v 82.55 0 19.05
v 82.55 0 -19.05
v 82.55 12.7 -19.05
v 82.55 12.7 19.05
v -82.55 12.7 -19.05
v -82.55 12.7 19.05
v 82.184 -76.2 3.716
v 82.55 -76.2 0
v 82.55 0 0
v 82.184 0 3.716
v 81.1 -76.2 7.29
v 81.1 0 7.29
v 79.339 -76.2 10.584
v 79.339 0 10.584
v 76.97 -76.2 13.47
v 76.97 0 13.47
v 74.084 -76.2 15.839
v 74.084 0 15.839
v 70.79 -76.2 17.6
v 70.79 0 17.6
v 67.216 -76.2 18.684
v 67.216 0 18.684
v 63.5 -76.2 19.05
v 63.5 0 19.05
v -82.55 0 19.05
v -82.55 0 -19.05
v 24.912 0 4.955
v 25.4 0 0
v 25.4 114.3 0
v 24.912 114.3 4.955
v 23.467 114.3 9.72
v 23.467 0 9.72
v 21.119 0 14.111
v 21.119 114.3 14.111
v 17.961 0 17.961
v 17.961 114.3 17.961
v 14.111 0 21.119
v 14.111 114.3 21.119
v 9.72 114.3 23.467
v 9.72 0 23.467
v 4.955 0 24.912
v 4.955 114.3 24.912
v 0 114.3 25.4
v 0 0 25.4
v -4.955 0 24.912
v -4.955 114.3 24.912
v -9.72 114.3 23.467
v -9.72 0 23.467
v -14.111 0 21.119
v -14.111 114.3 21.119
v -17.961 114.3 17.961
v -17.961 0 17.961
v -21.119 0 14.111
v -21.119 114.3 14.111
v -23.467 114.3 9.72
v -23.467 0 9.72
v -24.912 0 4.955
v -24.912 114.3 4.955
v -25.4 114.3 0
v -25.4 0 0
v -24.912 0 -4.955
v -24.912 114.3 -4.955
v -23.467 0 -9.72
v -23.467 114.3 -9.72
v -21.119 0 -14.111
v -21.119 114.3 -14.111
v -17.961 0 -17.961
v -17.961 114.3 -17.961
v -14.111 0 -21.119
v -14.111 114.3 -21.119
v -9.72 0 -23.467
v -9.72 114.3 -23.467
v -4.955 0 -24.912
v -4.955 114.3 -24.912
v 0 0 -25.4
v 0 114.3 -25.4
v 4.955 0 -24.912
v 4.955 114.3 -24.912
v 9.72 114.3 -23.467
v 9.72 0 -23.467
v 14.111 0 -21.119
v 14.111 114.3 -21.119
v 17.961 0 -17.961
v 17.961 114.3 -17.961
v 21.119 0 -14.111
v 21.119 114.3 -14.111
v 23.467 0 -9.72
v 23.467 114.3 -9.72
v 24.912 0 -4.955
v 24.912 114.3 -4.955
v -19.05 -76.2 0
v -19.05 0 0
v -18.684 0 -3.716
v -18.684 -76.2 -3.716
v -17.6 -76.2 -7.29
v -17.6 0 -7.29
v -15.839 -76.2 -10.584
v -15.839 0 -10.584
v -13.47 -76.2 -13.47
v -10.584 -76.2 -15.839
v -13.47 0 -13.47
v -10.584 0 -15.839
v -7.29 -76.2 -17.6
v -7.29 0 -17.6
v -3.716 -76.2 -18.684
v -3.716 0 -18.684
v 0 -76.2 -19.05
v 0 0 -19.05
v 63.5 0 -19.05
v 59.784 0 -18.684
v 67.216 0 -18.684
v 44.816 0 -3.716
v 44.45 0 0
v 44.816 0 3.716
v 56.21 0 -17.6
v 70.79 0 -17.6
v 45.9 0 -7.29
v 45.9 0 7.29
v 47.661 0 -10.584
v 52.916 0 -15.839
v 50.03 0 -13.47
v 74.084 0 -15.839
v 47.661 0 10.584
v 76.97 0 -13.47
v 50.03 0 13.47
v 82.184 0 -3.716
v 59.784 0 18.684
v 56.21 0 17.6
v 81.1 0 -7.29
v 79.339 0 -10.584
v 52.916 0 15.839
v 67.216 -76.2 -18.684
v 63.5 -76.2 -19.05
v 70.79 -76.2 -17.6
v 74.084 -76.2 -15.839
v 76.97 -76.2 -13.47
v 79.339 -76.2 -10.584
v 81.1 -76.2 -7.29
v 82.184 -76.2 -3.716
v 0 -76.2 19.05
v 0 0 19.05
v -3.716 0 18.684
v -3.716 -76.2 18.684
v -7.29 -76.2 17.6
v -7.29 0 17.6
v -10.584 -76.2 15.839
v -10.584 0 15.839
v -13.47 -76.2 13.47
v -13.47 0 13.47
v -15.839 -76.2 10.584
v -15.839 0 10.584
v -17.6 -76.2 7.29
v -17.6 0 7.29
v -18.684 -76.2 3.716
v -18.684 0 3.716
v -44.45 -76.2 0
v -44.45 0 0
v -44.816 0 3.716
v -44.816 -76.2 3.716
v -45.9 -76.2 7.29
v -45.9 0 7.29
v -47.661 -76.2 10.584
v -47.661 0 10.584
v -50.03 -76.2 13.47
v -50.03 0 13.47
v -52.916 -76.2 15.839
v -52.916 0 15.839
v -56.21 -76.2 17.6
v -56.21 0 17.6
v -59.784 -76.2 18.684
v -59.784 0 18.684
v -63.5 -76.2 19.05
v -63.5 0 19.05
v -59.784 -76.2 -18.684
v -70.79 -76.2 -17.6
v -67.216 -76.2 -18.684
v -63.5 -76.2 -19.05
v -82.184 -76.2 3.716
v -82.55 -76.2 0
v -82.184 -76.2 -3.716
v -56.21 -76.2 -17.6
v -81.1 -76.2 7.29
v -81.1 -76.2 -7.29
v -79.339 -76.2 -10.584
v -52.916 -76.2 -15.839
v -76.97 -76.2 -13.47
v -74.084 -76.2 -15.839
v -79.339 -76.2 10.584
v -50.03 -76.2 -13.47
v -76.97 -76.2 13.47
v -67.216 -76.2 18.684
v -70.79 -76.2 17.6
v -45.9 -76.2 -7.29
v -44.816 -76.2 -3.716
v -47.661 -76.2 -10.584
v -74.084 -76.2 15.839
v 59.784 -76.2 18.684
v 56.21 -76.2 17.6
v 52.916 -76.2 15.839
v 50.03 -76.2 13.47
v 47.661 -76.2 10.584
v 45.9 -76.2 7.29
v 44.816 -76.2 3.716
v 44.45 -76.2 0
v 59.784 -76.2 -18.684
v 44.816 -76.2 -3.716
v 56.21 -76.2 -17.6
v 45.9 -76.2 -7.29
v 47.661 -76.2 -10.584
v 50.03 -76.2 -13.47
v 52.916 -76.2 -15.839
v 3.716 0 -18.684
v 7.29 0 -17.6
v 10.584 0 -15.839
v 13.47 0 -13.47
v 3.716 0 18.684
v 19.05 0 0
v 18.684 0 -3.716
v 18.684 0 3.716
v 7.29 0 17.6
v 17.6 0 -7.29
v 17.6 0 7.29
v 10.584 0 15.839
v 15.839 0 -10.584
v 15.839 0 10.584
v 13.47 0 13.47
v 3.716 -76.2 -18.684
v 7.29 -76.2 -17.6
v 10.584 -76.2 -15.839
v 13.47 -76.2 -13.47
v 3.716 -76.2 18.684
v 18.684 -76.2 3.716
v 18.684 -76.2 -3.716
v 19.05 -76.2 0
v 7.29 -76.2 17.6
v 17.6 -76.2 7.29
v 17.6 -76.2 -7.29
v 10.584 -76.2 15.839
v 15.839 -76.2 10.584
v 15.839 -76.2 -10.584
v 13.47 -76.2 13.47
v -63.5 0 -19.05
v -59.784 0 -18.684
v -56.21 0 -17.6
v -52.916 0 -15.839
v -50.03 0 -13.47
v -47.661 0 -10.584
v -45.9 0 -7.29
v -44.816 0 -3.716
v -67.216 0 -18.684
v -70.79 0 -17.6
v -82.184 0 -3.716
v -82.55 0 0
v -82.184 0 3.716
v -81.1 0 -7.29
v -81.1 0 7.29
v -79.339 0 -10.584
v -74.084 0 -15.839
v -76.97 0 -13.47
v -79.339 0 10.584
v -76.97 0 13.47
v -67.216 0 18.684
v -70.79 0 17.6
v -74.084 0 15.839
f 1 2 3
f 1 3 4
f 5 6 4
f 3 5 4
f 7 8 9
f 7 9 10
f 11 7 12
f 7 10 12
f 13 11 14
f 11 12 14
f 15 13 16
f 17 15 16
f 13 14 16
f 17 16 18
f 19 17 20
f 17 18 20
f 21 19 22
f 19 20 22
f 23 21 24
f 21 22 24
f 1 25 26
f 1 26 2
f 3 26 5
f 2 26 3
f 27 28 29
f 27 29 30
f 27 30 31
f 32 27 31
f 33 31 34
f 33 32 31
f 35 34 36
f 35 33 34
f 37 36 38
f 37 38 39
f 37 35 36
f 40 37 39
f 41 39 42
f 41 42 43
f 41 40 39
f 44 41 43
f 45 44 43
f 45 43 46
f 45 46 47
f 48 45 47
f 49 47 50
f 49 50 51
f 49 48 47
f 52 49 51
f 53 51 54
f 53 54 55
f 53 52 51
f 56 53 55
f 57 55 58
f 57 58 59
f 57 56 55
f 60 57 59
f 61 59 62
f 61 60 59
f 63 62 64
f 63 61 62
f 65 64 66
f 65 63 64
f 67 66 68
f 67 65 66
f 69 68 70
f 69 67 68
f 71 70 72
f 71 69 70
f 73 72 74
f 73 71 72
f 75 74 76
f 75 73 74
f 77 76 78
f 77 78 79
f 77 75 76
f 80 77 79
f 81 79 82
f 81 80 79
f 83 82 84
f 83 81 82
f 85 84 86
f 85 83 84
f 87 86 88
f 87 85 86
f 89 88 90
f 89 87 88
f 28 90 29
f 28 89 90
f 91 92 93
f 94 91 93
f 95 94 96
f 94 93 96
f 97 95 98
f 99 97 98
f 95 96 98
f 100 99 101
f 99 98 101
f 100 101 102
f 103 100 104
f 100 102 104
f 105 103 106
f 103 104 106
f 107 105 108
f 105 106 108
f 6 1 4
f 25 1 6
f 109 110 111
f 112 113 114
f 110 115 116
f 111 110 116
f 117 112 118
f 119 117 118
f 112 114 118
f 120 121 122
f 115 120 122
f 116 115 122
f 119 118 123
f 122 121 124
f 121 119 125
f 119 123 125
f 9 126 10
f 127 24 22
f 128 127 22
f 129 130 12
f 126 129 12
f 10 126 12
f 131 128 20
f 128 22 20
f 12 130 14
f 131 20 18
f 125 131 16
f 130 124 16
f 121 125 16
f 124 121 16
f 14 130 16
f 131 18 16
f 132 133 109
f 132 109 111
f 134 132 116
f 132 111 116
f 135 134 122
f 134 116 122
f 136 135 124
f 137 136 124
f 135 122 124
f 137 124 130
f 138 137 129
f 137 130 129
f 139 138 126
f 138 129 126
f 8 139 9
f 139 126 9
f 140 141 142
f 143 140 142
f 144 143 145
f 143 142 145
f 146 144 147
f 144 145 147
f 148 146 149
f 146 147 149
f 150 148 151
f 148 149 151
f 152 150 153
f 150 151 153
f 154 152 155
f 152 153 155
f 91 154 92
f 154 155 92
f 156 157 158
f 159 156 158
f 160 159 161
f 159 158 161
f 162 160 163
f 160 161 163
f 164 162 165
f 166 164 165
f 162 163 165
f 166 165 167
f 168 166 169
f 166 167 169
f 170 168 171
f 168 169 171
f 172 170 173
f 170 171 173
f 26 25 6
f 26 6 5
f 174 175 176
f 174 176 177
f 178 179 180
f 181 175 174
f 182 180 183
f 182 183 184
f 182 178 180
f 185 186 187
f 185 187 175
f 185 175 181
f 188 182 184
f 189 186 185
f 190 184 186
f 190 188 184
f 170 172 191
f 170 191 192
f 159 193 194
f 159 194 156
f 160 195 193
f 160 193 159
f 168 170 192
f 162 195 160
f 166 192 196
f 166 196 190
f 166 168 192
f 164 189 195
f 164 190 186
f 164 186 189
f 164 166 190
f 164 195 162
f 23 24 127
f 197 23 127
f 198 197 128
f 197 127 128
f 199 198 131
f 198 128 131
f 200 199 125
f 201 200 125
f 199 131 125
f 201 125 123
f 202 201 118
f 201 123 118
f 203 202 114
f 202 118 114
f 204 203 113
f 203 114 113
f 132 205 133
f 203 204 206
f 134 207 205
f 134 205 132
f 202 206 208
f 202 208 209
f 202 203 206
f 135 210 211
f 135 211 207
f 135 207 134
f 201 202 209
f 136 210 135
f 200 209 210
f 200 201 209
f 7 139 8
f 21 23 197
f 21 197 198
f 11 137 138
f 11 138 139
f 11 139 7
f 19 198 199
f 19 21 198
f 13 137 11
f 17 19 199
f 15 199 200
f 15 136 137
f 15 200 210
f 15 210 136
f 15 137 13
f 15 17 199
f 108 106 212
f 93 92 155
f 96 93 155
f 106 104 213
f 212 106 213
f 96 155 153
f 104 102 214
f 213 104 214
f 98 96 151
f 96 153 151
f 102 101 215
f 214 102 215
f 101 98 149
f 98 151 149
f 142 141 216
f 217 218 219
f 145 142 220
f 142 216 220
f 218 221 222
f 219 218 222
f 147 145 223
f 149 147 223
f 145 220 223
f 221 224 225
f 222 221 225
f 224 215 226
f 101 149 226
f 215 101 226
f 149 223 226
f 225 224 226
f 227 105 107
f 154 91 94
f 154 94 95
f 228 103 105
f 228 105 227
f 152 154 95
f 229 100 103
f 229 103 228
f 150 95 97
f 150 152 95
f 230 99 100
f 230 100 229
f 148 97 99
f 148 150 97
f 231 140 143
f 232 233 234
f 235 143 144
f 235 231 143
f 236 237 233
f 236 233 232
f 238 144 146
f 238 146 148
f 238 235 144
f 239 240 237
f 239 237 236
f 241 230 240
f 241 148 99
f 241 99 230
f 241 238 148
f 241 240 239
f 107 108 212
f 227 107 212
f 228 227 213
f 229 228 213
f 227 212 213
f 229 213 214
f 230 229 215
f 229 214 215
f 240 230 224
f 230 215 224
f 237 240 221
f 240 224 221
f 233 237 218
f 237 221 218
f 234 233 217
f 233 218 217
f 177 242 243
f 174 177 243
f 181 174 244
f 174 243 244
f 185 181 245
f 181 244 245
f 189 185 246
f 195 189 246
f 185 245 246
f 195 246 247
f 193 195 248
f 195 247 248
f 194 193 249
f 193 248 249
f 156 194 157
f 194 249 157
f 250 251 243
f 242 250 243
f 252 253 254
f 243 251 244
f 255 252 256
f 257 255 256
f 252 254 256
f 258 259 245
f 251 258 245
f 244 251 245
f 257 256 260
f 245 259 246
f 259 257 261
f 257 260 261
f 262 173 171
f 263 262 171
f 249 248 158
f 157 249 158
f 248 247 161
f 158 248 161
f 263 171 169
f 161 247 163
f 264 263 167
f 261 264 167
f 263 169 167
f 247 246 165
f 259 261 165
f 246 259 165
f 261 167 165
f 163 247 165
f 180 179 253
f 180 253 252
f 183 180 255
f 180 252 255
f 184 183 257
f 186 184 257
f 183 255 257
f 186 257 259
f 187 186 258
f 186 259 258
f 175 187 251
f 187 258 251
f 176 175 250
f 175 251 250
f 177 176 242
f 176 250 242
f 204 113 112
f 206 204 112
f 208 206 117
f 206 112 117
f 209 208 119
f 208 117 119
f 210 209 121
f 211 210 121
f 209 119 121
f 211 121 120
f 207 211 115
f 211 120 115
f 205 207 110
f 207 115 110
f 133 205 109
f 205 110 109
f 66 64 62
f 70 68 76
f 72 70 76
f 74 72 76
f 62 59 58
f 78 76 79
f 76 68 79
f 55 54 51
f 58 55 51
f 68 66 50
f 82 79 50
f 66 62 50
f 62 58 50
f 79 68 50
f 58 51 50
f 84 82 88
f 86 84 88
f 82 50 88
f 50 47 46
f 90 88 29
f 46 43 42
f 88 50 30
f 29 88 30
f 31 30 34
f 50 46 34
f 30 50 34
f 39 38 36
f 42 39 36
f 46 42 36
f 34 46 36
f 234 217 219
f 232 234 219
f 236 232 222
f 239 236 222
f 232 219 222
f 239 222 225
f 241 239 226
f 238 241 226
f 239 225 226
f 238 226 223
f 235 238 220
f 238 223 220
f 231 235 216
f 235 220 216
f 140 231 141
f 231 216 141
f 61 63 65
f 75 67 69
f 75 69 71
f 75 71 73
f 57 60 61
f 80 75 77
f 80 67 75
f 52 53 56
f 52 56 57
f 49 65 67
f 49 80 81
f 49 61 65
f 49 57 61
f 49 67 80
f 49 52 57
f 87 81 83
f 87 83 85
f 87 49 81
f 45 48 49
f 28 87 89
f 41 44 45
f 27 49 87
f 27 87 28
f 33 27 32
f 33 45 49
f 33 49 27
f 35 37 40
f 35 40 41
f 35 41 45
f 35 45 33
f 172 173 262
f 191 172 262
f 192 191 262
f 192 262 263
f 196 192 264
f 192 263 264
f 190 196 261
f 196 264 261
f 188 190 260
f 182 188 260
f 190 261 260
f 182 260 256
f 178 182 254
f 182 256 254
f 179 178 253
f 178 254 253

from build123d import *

# Parameters (mm, degrees)
F1_DEPTH = 76.2
F2_DEPTH = 12.7
F3_R     = 25.4
F4_DEPTH = 114.3


with BuildPart() as f1:
    # F0 (on Front) → F1 (new body)
    with BuildSketch(Plane.XZ):
        with BuildLine():
            ThreePointArc((-44.45, 0), (-50.0296158184, 13.4703841816), (-63.5, 19.05))
            ThreePointArc((-63.5, 19.05), (-76.9703841264, 13.4703842368), (-82.55, 1.56e-07))
            ThreePointArc((-82.55, 1.56e-07), (-76.9703842368, -13.4703841264), (-63.5, -19.05))
            ThreePointArc((-63.5, -19.05), (-50.0296158184, -13.4703841816), (-44.45, 0))
        make_face()
    extrude(amount=F1_DEPTH)


with BuildPart() as f1b:
    # F0 (on Front) → F1, piece 2 (new body)
    with BuildSketch(Plane.XZ):
        with BuildLine():
            ThreePointArc((-7.38e-08, -19.05), (13.4703841555, -13.4703842077), (19.05, 0))
            Line((19.05, 0), (0, 0))
            Line((0, 0), (-19.05, 0))
            ThreePointArc((-19.05, 0), (-13.4703842077, -13.4703841555), (-7.38e-08, -19.05))
        make_face()
        with BuildLine():
            Line((0, 0), (19.05, 0))
            ThreePointArc((19.05, 0), (13.4703841605, 13.4703842027), (-5.96e-08, 19.05))
            ThreePointArc((-5.96e-08, 19.05), (-13.4703842027, 13.4703841605), (-19.05, 0))
            Line((-19.05, 0), (0, 0))
        make_face()
    extrude(amount=F1_DEPTH)


with BuildPart() as f1c:
    # F0 (on Front) → F1, piece 3 (new body)
    with BuildSketch(Plane.XZ):
        with BuildLine():
            ThreePointArc((63.5, 19.05), (50.0296158184, 13.4703841816), (44.45, 0))
            ThreePointArc((44.45, 0), (50.0296158184, -13.4703841816), (63.5, -19.05))
            ThreePointArc((63.5, -19.05), (76.9703841816, -13.4703841816), (82.55, 0))
            ThreePointArc((82.55, 0), (76.9703841816, 13.4703841816), (63.5, 19.05))
        make_face()
    extrude(amount=F1_DEPTH)


with BuildPart() as f2:
    # F0 (on Front) → F2 (new body)
    with BuildSketch(Plane.XZ):
        with BuildLine():
            ThreePointArc((-7.38e-08, -19.05), (13.4703841555, -13.4703842077), (19.05, 0))
            Line((19.05, 0), (0, 0))
            Line((0, 0), (-19.05, 0))
            ThreePointArc((-19.05, 0), (-13.4703842077, -13.4703841555), (-7.38e-08, -19.05))
        make_face()
        with BuildLine():
            Line((0, 0), (19.05, 0))
            ThreePointArc((19.05, 0), (13.4703841605, 13.4703842027), (-5.96e-08, 19.05))
            ThreePointArc((-5.96e-08, 19.05), (-13.4703842027, 13.4703841605), (-19.05, 0))
            Line((-19.05, 0), (0, 0))
        make_face()
        with BuildLine():
            ThreePointArc((-44.45, 0), (-50.0296158184, 13.4703841816), (-63.5, 19.05))
            ThreePointArc((-63.5, 19.05), (-76.9703841264, 13.4703842368), (-82.55, 1.56e-07))
            ThreePointArc((-82.55, 1.56e-07), (-76.9703842368, -13.4703841264), (-63.5, -19.05))
            ThreePointArc((-63.5, -19.05), (-50.0296158184, -13.4703841816), (-44.45, 0))
        make_face()
        with BuildLine():
            ThreePointArc((-19.05, 0), (-13.4703842027, 13.4703841605), (-5.96e-08, 19.05))
            Line((-5.96e-08, 19.05), (-63.5, 19.05))
            ThreePointArc((-63.5, 19.05), (-50.0296158184, 13.4703841816), (-44.45, 0))
            Line((-44.45, 0), (-19.05, 0))
        make_face()
        with BuildLine():
            Line((-63.5, -19.05), (-7.38e-08, -19.05))
            ThreePointArc((-7.38e-08, -19.05), (-13.4703842077, -13.4703841555), (-19.05, 0))
            Line((-19.05, 0), (-44.45, 0))
            ThreePointArc((-44.45, 0), (-50.0296158184, -13.4703841816), (-63.5, -19.05))
        make_face()
        with BuildLine():
            Line((-82.55, -19.05), (-63.5, -19.05))
            ThreePointArc((-63.5, -19.05), (-76.9703842368, -13.4703841264), (-82.55, 1.56e-07))
            Line((-82.55, 1.56e-07), (-82.55, -19.05))
        make_face()
        with BuildLine():
            ThreePointArc((-82.55, 1.56e-07), (-76.9703841264, 13.4703842368), (-63.5, 19.05))
            Line((-63.5, 19.05), (-82.55, 19.05))
            Line((-82.55, 19.05), (-82.55, 1.56e-07))
        make_face()
        with BuildLine():
            ThreePointArc((-5.96e-08, 19.05), (13.4703841605, 13.4703842027), (19.05, 0))
            Line((19.05, 0), (44.45, 0))
            ThreePointArc((44.45, 0), (50.0296158184, 13.4703841816), (63.5, 19.05))
            Line((63.5, 19.05), (-5.96e-08, 19.05))
        make_face()
        with BuildLine():
            Line((44.45, 0), (19.05, 0))
            ThreePointArc((19.05, 0), (13.4703841555, -13.4703842077), (-7.38e-08, -19.05))
            Line((-7.38e-08, -19.05), (63.5, -19.05))
            ThreePointArc((63.5, -19.05), (50.0296158184, -13.4703841816), (44.45, 0))
        make_face()
        with BuildLine():
            ThreePointArc((63.5, 19.05), (50.0296158184, 13.4703841816), (44.45, 0))
            ThreePointArc((44.45, 0), (50.0296158184, -13.4703841816), (63.5, -19.05))
            ThreePointArc((63.5, -19.05), (76.9703841816, -13.4703841816), (82.55, 0))
            ThreePointArc((82.55, 0), (76.9703841816, 13.4703841816), (63.5, 19.05))
        make_face()
        with BuildLine():
            ThreePointArc((82.55, 0), (76.9703841816, -13.4703841816), (63.5, -19.05))
            Line((63.5, -19.05), (82.55, -19.05))
            Line((82.55, -19.05), (82.55, 0))
        make_face()
        with BuildLine():
            Line((82.55, 19.05), (63.5, 19.05))
            ThreePointArc((63.5, 19.05), (76.9703841816, 13.4703841816), (82.55, 0))
            Line((82.55, 0), (82.55, 19.05))
        make_face()
    extrude(amount=-F2_DEPTH)


with BuildPart() as f4:
    # F3 (on Front) → F4 (new body)
    with BuildSketch(Plane.XZ):
        Circle(F3_R)
    extrude(amount=-F4_DEPTH)


solid = Compound([f1.part, f1b.part, f1c.part, f2.part, f4.part])
